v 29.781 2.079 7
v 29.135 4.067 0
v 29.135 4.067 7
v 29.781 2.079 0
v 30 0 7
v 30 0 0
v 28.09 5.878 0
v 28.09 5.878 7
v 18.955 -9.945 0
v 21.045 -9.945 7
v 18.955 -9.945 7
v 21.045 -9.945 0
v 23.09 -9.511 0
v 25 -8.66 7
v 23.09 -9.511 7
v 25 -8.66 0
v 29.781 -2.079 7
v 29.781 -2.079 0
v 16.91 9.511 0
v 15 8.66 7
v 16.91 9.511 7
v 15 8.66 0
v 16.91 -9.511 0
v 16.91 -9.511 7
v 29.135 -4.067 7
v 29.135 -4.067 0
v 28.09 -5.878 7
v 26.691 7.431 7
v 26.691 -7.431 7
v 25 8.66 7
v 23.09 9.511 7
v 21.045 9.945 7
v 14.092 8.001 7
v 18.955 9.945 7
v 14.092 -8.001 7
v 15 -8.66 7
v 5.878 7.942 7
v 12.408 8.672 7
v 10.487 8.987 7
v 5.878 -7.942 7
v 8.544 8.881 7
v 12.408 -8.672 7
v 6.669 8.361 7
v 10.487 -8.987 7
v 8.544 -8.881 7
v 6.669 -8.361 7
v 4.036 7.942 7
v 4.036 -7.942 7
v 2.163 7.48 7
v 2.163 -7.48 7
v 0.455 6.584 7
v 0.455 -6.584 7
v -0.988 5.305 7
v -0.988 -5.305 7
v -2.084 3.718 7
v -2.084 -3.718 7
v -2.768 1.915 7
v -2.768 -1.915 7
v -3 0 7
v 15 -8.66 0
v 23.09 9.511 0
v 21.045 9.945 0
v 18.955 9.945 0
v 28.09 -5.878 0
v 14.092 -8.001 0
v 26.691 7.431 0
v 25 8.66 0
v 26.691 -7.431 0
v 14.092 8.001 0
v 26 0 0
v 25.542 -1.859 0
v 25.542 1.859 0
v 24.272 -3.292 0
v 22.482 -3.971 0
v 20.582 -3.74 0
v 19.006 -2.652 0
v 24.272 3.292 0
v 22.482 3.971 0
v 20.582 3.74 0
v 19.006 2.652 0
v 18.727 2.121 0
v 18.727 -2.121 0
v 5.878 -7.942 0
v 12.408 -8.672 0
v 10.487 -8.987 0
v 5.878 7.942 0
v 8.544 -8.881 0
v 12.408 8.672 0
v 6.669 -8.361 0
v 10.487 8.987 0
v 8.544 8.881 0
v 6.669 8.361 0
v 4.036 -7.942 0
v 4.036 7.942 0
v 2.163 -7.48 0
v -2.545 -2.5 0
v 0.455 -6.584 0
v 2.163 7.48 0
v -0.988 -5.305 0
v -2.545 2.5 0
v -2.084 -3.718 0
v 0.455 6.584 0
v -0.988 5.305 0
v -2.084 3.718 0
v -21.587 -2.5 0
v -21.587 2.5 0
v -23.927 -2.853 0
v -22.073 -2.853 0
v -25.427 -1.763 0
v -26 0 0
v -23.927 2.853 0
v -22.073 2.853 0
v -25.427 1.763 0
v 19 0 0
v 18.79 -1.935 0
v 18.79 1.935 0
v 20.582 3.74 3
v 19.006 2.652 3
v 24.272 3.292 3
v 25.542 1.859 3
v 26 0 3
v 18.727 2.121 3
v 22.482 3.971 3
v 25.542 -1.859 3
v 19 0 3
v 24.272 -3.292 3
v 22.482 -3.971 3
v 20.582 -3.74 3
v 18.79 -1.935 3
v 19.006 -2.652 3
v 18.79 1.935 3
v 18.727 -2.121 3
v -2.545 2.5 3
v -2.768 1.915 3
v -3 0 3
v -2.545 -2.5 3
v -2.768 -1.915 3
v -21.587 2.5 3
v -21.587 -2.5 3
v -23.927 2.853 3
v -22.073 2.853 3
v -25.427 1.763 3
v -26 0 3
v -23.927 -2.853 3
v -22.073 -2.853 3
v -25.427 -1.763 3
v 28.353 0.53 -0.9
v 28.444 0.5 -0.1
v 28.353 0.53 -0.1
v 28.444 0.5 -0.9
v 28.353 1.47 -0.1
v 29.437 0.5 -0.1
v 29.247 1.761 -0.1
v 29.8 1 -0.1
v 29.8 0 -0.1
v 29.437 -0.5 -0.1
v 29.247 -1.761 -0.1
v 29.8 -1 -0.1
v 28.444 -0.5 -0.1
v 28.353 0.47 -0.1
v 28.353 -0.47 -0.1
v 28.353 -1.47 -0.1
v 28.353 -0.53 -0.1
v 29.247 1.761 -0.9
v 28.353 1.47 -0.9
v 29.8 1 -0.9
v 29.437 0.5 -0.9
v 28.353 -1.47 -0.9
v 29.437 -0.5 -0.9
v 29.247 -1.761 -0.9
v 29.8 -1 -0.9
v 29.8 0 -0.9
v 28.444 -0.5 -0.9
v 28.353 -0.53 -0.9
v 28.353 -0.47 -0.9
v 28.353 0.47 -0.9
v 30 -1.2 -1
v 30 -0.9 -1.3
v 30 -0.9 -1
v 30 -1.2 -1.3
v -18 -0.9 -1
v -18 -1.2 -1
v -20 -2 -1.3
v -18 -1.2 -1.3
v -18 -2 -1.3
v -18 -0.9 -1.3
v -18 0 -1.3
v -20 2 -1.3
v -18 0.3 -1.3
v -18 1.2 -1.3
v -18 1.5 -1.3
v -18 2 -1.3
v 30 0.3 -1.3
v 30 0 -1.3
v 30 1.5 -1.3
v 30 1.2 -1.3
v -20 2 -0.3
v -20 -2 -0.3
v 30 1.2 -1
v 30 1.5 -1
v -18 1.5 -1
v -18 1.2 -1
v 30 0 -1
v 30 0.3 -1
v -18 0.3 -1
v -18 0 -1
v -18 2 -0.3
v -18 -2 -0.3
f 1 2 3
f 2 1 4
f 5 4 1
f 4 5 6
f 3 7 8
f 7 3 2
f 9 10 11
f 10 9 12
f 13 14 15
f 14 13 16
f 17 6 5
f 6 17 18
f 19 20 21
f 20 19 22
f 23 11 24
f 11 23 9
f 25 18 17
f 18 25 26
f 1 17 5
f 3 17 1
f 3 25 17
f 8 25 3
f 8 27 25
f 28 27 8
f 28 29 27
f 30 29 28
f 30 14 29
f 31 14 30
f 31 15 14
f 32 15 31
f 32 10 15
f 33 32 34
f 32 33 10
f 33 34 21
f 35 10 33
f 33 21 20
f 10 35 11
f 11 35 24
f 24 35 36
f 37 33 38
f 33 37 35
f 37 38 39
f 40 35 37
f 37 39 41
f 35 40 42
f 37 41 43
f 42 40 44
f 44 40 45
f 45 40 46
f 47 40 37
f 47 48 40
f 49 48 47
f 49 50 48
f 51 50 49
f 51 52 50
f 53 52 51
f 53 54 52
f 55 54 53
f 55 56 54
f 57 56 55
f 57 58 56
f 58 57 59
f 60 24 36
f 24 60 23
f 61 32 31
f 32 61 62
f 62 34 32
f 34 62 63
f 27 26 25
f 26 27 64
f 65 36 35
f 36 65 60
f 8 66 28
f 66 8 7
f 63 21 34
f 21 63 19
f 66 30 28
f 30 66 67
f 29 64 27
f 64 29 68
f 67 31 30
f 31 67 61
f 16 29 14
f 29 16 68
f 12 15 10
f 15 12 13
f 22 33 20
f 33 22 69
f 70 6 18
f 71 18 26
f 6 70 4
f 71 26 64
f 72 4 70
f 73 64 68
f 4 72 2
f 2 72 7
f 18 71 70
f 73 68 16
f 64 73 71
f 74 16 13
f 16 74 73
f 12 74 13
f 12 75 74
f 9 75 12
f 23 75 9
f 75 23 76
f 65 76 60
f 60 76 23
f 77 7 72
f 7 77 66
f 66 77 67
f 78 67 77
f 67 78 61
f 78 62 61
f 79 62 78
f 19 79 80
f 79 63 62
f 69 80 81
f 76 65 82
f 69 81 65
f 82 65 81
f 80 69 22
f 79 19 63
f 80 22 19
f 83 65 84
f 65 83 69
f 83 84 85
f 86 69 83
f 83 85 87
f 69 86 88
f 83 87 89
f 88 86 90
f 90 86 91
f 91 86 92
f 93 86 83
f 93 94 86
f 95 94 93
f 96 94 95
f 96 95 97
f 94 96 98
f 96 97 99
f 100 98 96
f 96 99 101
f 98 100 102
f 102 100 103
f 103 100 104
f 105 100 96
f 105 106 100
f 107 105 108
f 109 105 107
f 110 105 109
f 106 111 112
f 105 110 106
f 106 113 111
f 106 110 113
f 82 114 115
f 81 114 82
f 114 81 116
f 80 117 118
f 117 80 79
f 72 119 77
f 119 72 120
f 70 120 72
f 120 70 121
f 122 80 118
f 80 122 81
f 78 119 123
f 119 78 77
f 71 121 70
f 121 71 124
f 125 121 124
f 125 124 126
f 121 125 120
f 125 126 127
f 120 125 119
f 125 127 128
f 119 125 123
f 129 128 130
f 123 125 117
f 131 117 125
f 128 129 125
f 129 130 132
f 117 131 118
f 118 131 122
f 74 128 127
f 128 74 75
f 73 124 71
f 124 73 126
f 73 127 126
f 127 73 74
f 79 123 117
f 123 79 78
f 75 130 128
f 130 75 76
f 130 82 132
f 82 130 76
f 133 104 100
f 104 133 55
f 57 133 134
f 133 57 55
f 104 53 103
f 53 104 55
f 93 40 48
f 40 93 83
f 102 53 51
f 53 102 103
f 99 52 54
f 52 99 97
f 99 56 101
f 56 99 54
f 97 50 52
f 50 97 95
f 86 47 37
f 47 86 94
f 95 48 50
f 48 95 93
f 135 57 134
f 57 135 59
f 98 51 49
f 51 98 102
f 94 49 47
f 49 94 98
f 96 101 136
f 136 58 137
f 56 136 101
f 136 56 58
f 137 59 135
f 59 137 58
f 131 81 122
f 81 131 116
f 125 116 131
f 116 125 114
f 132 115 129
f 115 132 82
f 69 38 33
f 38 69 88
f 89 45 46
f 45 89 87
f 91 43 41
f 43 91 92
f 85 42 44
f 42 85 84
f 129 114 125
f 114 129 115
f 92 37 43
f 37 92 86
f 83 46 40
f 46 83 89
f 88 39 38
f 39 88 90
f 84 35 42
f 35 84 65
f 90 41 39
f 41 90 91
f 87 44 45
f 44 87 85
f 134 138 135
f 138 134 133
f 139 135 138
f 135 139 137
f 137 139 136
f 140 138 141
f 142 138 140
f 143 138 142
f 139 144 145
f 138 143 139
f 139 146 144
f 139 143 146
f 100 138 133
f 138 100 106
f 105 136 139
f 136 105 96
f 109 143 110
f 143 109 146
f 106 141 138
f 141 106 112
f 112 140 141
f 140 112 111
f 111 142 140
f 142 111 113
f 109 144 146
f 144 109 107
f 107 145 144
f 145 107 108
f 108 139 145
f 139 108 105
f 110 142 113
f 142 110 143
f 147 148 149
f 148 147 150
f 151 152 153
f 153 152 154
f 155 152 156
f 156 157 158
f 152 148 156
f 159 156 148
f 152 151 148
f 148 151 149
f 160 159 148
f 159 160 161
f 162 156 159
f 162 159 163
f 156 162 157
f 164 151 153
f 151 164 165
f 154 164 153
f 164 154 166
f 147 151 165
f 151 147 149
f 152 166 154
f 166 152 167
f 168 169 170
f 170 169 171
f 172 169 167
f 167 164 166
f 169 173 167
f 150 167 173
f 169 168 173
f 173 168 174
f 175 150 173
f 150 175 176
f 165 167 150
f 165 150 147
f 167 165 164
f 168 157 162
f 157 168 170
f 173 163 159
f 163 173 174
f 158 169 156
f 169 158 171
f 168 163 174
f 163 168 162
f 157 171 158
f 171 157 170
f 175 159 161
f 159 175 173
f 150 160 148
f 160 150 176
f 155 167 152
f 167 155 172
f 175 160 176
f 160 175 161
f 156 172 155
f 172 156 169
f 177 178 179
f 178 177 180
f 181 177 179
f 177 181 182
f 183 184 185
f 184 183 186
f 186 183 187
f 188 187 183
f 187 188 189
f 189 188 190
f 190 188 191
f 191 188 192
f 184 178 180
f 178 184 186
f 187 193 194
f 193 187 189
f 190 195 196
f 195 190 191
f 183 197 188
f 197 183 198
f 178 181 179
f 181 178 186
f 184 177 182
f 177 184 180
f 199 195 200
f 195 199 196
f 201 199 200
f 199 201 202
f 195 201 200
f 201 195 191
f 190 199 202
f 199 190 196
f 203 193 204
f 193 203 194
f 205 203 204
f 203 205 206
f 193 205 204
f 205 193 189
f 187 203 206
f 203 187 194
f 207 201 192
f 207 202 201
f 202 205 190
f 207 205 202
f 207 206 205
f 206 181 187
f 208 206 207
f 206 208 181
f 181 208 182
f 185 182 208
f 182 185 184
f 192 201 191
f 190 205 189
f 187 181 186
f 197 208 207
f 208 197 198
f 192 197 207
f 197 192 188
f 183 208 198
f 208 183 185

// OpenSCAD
translate([5,0,0])cylinder(7,8,8);
difference () {
translate([20,0,0])cylinder(7,10,10);
translate([22,0,-1])cylinder(4,4,4);
}
translate([10,0,0])cylinder(7,9,9);
translate([-22,-2.5,0])cube ([20,5,3]) ;
translate([-23,-0,0])cylinder (3,3,3);

translate([29,1,-0.9])cylinder (0.8,0.8,0.8);
translate([29,-1,-0.9])cylinder (0.8,0.8,0.8);
translate([29,-0,-0.9])cylinder (0.8,0.8,0.8);

translate([-20,-1.2,-1.3]) cube ([50,0.3,0.3]) ;
translate([-20,1.2,-1.3]) cube ([50,0.3,0.3]) ;
translate([-20,0,-1.3]) cube ([50,0.3,0.3]) ;

translate([-20,-2,-1.3]) cube ([2,4,1]) ;
